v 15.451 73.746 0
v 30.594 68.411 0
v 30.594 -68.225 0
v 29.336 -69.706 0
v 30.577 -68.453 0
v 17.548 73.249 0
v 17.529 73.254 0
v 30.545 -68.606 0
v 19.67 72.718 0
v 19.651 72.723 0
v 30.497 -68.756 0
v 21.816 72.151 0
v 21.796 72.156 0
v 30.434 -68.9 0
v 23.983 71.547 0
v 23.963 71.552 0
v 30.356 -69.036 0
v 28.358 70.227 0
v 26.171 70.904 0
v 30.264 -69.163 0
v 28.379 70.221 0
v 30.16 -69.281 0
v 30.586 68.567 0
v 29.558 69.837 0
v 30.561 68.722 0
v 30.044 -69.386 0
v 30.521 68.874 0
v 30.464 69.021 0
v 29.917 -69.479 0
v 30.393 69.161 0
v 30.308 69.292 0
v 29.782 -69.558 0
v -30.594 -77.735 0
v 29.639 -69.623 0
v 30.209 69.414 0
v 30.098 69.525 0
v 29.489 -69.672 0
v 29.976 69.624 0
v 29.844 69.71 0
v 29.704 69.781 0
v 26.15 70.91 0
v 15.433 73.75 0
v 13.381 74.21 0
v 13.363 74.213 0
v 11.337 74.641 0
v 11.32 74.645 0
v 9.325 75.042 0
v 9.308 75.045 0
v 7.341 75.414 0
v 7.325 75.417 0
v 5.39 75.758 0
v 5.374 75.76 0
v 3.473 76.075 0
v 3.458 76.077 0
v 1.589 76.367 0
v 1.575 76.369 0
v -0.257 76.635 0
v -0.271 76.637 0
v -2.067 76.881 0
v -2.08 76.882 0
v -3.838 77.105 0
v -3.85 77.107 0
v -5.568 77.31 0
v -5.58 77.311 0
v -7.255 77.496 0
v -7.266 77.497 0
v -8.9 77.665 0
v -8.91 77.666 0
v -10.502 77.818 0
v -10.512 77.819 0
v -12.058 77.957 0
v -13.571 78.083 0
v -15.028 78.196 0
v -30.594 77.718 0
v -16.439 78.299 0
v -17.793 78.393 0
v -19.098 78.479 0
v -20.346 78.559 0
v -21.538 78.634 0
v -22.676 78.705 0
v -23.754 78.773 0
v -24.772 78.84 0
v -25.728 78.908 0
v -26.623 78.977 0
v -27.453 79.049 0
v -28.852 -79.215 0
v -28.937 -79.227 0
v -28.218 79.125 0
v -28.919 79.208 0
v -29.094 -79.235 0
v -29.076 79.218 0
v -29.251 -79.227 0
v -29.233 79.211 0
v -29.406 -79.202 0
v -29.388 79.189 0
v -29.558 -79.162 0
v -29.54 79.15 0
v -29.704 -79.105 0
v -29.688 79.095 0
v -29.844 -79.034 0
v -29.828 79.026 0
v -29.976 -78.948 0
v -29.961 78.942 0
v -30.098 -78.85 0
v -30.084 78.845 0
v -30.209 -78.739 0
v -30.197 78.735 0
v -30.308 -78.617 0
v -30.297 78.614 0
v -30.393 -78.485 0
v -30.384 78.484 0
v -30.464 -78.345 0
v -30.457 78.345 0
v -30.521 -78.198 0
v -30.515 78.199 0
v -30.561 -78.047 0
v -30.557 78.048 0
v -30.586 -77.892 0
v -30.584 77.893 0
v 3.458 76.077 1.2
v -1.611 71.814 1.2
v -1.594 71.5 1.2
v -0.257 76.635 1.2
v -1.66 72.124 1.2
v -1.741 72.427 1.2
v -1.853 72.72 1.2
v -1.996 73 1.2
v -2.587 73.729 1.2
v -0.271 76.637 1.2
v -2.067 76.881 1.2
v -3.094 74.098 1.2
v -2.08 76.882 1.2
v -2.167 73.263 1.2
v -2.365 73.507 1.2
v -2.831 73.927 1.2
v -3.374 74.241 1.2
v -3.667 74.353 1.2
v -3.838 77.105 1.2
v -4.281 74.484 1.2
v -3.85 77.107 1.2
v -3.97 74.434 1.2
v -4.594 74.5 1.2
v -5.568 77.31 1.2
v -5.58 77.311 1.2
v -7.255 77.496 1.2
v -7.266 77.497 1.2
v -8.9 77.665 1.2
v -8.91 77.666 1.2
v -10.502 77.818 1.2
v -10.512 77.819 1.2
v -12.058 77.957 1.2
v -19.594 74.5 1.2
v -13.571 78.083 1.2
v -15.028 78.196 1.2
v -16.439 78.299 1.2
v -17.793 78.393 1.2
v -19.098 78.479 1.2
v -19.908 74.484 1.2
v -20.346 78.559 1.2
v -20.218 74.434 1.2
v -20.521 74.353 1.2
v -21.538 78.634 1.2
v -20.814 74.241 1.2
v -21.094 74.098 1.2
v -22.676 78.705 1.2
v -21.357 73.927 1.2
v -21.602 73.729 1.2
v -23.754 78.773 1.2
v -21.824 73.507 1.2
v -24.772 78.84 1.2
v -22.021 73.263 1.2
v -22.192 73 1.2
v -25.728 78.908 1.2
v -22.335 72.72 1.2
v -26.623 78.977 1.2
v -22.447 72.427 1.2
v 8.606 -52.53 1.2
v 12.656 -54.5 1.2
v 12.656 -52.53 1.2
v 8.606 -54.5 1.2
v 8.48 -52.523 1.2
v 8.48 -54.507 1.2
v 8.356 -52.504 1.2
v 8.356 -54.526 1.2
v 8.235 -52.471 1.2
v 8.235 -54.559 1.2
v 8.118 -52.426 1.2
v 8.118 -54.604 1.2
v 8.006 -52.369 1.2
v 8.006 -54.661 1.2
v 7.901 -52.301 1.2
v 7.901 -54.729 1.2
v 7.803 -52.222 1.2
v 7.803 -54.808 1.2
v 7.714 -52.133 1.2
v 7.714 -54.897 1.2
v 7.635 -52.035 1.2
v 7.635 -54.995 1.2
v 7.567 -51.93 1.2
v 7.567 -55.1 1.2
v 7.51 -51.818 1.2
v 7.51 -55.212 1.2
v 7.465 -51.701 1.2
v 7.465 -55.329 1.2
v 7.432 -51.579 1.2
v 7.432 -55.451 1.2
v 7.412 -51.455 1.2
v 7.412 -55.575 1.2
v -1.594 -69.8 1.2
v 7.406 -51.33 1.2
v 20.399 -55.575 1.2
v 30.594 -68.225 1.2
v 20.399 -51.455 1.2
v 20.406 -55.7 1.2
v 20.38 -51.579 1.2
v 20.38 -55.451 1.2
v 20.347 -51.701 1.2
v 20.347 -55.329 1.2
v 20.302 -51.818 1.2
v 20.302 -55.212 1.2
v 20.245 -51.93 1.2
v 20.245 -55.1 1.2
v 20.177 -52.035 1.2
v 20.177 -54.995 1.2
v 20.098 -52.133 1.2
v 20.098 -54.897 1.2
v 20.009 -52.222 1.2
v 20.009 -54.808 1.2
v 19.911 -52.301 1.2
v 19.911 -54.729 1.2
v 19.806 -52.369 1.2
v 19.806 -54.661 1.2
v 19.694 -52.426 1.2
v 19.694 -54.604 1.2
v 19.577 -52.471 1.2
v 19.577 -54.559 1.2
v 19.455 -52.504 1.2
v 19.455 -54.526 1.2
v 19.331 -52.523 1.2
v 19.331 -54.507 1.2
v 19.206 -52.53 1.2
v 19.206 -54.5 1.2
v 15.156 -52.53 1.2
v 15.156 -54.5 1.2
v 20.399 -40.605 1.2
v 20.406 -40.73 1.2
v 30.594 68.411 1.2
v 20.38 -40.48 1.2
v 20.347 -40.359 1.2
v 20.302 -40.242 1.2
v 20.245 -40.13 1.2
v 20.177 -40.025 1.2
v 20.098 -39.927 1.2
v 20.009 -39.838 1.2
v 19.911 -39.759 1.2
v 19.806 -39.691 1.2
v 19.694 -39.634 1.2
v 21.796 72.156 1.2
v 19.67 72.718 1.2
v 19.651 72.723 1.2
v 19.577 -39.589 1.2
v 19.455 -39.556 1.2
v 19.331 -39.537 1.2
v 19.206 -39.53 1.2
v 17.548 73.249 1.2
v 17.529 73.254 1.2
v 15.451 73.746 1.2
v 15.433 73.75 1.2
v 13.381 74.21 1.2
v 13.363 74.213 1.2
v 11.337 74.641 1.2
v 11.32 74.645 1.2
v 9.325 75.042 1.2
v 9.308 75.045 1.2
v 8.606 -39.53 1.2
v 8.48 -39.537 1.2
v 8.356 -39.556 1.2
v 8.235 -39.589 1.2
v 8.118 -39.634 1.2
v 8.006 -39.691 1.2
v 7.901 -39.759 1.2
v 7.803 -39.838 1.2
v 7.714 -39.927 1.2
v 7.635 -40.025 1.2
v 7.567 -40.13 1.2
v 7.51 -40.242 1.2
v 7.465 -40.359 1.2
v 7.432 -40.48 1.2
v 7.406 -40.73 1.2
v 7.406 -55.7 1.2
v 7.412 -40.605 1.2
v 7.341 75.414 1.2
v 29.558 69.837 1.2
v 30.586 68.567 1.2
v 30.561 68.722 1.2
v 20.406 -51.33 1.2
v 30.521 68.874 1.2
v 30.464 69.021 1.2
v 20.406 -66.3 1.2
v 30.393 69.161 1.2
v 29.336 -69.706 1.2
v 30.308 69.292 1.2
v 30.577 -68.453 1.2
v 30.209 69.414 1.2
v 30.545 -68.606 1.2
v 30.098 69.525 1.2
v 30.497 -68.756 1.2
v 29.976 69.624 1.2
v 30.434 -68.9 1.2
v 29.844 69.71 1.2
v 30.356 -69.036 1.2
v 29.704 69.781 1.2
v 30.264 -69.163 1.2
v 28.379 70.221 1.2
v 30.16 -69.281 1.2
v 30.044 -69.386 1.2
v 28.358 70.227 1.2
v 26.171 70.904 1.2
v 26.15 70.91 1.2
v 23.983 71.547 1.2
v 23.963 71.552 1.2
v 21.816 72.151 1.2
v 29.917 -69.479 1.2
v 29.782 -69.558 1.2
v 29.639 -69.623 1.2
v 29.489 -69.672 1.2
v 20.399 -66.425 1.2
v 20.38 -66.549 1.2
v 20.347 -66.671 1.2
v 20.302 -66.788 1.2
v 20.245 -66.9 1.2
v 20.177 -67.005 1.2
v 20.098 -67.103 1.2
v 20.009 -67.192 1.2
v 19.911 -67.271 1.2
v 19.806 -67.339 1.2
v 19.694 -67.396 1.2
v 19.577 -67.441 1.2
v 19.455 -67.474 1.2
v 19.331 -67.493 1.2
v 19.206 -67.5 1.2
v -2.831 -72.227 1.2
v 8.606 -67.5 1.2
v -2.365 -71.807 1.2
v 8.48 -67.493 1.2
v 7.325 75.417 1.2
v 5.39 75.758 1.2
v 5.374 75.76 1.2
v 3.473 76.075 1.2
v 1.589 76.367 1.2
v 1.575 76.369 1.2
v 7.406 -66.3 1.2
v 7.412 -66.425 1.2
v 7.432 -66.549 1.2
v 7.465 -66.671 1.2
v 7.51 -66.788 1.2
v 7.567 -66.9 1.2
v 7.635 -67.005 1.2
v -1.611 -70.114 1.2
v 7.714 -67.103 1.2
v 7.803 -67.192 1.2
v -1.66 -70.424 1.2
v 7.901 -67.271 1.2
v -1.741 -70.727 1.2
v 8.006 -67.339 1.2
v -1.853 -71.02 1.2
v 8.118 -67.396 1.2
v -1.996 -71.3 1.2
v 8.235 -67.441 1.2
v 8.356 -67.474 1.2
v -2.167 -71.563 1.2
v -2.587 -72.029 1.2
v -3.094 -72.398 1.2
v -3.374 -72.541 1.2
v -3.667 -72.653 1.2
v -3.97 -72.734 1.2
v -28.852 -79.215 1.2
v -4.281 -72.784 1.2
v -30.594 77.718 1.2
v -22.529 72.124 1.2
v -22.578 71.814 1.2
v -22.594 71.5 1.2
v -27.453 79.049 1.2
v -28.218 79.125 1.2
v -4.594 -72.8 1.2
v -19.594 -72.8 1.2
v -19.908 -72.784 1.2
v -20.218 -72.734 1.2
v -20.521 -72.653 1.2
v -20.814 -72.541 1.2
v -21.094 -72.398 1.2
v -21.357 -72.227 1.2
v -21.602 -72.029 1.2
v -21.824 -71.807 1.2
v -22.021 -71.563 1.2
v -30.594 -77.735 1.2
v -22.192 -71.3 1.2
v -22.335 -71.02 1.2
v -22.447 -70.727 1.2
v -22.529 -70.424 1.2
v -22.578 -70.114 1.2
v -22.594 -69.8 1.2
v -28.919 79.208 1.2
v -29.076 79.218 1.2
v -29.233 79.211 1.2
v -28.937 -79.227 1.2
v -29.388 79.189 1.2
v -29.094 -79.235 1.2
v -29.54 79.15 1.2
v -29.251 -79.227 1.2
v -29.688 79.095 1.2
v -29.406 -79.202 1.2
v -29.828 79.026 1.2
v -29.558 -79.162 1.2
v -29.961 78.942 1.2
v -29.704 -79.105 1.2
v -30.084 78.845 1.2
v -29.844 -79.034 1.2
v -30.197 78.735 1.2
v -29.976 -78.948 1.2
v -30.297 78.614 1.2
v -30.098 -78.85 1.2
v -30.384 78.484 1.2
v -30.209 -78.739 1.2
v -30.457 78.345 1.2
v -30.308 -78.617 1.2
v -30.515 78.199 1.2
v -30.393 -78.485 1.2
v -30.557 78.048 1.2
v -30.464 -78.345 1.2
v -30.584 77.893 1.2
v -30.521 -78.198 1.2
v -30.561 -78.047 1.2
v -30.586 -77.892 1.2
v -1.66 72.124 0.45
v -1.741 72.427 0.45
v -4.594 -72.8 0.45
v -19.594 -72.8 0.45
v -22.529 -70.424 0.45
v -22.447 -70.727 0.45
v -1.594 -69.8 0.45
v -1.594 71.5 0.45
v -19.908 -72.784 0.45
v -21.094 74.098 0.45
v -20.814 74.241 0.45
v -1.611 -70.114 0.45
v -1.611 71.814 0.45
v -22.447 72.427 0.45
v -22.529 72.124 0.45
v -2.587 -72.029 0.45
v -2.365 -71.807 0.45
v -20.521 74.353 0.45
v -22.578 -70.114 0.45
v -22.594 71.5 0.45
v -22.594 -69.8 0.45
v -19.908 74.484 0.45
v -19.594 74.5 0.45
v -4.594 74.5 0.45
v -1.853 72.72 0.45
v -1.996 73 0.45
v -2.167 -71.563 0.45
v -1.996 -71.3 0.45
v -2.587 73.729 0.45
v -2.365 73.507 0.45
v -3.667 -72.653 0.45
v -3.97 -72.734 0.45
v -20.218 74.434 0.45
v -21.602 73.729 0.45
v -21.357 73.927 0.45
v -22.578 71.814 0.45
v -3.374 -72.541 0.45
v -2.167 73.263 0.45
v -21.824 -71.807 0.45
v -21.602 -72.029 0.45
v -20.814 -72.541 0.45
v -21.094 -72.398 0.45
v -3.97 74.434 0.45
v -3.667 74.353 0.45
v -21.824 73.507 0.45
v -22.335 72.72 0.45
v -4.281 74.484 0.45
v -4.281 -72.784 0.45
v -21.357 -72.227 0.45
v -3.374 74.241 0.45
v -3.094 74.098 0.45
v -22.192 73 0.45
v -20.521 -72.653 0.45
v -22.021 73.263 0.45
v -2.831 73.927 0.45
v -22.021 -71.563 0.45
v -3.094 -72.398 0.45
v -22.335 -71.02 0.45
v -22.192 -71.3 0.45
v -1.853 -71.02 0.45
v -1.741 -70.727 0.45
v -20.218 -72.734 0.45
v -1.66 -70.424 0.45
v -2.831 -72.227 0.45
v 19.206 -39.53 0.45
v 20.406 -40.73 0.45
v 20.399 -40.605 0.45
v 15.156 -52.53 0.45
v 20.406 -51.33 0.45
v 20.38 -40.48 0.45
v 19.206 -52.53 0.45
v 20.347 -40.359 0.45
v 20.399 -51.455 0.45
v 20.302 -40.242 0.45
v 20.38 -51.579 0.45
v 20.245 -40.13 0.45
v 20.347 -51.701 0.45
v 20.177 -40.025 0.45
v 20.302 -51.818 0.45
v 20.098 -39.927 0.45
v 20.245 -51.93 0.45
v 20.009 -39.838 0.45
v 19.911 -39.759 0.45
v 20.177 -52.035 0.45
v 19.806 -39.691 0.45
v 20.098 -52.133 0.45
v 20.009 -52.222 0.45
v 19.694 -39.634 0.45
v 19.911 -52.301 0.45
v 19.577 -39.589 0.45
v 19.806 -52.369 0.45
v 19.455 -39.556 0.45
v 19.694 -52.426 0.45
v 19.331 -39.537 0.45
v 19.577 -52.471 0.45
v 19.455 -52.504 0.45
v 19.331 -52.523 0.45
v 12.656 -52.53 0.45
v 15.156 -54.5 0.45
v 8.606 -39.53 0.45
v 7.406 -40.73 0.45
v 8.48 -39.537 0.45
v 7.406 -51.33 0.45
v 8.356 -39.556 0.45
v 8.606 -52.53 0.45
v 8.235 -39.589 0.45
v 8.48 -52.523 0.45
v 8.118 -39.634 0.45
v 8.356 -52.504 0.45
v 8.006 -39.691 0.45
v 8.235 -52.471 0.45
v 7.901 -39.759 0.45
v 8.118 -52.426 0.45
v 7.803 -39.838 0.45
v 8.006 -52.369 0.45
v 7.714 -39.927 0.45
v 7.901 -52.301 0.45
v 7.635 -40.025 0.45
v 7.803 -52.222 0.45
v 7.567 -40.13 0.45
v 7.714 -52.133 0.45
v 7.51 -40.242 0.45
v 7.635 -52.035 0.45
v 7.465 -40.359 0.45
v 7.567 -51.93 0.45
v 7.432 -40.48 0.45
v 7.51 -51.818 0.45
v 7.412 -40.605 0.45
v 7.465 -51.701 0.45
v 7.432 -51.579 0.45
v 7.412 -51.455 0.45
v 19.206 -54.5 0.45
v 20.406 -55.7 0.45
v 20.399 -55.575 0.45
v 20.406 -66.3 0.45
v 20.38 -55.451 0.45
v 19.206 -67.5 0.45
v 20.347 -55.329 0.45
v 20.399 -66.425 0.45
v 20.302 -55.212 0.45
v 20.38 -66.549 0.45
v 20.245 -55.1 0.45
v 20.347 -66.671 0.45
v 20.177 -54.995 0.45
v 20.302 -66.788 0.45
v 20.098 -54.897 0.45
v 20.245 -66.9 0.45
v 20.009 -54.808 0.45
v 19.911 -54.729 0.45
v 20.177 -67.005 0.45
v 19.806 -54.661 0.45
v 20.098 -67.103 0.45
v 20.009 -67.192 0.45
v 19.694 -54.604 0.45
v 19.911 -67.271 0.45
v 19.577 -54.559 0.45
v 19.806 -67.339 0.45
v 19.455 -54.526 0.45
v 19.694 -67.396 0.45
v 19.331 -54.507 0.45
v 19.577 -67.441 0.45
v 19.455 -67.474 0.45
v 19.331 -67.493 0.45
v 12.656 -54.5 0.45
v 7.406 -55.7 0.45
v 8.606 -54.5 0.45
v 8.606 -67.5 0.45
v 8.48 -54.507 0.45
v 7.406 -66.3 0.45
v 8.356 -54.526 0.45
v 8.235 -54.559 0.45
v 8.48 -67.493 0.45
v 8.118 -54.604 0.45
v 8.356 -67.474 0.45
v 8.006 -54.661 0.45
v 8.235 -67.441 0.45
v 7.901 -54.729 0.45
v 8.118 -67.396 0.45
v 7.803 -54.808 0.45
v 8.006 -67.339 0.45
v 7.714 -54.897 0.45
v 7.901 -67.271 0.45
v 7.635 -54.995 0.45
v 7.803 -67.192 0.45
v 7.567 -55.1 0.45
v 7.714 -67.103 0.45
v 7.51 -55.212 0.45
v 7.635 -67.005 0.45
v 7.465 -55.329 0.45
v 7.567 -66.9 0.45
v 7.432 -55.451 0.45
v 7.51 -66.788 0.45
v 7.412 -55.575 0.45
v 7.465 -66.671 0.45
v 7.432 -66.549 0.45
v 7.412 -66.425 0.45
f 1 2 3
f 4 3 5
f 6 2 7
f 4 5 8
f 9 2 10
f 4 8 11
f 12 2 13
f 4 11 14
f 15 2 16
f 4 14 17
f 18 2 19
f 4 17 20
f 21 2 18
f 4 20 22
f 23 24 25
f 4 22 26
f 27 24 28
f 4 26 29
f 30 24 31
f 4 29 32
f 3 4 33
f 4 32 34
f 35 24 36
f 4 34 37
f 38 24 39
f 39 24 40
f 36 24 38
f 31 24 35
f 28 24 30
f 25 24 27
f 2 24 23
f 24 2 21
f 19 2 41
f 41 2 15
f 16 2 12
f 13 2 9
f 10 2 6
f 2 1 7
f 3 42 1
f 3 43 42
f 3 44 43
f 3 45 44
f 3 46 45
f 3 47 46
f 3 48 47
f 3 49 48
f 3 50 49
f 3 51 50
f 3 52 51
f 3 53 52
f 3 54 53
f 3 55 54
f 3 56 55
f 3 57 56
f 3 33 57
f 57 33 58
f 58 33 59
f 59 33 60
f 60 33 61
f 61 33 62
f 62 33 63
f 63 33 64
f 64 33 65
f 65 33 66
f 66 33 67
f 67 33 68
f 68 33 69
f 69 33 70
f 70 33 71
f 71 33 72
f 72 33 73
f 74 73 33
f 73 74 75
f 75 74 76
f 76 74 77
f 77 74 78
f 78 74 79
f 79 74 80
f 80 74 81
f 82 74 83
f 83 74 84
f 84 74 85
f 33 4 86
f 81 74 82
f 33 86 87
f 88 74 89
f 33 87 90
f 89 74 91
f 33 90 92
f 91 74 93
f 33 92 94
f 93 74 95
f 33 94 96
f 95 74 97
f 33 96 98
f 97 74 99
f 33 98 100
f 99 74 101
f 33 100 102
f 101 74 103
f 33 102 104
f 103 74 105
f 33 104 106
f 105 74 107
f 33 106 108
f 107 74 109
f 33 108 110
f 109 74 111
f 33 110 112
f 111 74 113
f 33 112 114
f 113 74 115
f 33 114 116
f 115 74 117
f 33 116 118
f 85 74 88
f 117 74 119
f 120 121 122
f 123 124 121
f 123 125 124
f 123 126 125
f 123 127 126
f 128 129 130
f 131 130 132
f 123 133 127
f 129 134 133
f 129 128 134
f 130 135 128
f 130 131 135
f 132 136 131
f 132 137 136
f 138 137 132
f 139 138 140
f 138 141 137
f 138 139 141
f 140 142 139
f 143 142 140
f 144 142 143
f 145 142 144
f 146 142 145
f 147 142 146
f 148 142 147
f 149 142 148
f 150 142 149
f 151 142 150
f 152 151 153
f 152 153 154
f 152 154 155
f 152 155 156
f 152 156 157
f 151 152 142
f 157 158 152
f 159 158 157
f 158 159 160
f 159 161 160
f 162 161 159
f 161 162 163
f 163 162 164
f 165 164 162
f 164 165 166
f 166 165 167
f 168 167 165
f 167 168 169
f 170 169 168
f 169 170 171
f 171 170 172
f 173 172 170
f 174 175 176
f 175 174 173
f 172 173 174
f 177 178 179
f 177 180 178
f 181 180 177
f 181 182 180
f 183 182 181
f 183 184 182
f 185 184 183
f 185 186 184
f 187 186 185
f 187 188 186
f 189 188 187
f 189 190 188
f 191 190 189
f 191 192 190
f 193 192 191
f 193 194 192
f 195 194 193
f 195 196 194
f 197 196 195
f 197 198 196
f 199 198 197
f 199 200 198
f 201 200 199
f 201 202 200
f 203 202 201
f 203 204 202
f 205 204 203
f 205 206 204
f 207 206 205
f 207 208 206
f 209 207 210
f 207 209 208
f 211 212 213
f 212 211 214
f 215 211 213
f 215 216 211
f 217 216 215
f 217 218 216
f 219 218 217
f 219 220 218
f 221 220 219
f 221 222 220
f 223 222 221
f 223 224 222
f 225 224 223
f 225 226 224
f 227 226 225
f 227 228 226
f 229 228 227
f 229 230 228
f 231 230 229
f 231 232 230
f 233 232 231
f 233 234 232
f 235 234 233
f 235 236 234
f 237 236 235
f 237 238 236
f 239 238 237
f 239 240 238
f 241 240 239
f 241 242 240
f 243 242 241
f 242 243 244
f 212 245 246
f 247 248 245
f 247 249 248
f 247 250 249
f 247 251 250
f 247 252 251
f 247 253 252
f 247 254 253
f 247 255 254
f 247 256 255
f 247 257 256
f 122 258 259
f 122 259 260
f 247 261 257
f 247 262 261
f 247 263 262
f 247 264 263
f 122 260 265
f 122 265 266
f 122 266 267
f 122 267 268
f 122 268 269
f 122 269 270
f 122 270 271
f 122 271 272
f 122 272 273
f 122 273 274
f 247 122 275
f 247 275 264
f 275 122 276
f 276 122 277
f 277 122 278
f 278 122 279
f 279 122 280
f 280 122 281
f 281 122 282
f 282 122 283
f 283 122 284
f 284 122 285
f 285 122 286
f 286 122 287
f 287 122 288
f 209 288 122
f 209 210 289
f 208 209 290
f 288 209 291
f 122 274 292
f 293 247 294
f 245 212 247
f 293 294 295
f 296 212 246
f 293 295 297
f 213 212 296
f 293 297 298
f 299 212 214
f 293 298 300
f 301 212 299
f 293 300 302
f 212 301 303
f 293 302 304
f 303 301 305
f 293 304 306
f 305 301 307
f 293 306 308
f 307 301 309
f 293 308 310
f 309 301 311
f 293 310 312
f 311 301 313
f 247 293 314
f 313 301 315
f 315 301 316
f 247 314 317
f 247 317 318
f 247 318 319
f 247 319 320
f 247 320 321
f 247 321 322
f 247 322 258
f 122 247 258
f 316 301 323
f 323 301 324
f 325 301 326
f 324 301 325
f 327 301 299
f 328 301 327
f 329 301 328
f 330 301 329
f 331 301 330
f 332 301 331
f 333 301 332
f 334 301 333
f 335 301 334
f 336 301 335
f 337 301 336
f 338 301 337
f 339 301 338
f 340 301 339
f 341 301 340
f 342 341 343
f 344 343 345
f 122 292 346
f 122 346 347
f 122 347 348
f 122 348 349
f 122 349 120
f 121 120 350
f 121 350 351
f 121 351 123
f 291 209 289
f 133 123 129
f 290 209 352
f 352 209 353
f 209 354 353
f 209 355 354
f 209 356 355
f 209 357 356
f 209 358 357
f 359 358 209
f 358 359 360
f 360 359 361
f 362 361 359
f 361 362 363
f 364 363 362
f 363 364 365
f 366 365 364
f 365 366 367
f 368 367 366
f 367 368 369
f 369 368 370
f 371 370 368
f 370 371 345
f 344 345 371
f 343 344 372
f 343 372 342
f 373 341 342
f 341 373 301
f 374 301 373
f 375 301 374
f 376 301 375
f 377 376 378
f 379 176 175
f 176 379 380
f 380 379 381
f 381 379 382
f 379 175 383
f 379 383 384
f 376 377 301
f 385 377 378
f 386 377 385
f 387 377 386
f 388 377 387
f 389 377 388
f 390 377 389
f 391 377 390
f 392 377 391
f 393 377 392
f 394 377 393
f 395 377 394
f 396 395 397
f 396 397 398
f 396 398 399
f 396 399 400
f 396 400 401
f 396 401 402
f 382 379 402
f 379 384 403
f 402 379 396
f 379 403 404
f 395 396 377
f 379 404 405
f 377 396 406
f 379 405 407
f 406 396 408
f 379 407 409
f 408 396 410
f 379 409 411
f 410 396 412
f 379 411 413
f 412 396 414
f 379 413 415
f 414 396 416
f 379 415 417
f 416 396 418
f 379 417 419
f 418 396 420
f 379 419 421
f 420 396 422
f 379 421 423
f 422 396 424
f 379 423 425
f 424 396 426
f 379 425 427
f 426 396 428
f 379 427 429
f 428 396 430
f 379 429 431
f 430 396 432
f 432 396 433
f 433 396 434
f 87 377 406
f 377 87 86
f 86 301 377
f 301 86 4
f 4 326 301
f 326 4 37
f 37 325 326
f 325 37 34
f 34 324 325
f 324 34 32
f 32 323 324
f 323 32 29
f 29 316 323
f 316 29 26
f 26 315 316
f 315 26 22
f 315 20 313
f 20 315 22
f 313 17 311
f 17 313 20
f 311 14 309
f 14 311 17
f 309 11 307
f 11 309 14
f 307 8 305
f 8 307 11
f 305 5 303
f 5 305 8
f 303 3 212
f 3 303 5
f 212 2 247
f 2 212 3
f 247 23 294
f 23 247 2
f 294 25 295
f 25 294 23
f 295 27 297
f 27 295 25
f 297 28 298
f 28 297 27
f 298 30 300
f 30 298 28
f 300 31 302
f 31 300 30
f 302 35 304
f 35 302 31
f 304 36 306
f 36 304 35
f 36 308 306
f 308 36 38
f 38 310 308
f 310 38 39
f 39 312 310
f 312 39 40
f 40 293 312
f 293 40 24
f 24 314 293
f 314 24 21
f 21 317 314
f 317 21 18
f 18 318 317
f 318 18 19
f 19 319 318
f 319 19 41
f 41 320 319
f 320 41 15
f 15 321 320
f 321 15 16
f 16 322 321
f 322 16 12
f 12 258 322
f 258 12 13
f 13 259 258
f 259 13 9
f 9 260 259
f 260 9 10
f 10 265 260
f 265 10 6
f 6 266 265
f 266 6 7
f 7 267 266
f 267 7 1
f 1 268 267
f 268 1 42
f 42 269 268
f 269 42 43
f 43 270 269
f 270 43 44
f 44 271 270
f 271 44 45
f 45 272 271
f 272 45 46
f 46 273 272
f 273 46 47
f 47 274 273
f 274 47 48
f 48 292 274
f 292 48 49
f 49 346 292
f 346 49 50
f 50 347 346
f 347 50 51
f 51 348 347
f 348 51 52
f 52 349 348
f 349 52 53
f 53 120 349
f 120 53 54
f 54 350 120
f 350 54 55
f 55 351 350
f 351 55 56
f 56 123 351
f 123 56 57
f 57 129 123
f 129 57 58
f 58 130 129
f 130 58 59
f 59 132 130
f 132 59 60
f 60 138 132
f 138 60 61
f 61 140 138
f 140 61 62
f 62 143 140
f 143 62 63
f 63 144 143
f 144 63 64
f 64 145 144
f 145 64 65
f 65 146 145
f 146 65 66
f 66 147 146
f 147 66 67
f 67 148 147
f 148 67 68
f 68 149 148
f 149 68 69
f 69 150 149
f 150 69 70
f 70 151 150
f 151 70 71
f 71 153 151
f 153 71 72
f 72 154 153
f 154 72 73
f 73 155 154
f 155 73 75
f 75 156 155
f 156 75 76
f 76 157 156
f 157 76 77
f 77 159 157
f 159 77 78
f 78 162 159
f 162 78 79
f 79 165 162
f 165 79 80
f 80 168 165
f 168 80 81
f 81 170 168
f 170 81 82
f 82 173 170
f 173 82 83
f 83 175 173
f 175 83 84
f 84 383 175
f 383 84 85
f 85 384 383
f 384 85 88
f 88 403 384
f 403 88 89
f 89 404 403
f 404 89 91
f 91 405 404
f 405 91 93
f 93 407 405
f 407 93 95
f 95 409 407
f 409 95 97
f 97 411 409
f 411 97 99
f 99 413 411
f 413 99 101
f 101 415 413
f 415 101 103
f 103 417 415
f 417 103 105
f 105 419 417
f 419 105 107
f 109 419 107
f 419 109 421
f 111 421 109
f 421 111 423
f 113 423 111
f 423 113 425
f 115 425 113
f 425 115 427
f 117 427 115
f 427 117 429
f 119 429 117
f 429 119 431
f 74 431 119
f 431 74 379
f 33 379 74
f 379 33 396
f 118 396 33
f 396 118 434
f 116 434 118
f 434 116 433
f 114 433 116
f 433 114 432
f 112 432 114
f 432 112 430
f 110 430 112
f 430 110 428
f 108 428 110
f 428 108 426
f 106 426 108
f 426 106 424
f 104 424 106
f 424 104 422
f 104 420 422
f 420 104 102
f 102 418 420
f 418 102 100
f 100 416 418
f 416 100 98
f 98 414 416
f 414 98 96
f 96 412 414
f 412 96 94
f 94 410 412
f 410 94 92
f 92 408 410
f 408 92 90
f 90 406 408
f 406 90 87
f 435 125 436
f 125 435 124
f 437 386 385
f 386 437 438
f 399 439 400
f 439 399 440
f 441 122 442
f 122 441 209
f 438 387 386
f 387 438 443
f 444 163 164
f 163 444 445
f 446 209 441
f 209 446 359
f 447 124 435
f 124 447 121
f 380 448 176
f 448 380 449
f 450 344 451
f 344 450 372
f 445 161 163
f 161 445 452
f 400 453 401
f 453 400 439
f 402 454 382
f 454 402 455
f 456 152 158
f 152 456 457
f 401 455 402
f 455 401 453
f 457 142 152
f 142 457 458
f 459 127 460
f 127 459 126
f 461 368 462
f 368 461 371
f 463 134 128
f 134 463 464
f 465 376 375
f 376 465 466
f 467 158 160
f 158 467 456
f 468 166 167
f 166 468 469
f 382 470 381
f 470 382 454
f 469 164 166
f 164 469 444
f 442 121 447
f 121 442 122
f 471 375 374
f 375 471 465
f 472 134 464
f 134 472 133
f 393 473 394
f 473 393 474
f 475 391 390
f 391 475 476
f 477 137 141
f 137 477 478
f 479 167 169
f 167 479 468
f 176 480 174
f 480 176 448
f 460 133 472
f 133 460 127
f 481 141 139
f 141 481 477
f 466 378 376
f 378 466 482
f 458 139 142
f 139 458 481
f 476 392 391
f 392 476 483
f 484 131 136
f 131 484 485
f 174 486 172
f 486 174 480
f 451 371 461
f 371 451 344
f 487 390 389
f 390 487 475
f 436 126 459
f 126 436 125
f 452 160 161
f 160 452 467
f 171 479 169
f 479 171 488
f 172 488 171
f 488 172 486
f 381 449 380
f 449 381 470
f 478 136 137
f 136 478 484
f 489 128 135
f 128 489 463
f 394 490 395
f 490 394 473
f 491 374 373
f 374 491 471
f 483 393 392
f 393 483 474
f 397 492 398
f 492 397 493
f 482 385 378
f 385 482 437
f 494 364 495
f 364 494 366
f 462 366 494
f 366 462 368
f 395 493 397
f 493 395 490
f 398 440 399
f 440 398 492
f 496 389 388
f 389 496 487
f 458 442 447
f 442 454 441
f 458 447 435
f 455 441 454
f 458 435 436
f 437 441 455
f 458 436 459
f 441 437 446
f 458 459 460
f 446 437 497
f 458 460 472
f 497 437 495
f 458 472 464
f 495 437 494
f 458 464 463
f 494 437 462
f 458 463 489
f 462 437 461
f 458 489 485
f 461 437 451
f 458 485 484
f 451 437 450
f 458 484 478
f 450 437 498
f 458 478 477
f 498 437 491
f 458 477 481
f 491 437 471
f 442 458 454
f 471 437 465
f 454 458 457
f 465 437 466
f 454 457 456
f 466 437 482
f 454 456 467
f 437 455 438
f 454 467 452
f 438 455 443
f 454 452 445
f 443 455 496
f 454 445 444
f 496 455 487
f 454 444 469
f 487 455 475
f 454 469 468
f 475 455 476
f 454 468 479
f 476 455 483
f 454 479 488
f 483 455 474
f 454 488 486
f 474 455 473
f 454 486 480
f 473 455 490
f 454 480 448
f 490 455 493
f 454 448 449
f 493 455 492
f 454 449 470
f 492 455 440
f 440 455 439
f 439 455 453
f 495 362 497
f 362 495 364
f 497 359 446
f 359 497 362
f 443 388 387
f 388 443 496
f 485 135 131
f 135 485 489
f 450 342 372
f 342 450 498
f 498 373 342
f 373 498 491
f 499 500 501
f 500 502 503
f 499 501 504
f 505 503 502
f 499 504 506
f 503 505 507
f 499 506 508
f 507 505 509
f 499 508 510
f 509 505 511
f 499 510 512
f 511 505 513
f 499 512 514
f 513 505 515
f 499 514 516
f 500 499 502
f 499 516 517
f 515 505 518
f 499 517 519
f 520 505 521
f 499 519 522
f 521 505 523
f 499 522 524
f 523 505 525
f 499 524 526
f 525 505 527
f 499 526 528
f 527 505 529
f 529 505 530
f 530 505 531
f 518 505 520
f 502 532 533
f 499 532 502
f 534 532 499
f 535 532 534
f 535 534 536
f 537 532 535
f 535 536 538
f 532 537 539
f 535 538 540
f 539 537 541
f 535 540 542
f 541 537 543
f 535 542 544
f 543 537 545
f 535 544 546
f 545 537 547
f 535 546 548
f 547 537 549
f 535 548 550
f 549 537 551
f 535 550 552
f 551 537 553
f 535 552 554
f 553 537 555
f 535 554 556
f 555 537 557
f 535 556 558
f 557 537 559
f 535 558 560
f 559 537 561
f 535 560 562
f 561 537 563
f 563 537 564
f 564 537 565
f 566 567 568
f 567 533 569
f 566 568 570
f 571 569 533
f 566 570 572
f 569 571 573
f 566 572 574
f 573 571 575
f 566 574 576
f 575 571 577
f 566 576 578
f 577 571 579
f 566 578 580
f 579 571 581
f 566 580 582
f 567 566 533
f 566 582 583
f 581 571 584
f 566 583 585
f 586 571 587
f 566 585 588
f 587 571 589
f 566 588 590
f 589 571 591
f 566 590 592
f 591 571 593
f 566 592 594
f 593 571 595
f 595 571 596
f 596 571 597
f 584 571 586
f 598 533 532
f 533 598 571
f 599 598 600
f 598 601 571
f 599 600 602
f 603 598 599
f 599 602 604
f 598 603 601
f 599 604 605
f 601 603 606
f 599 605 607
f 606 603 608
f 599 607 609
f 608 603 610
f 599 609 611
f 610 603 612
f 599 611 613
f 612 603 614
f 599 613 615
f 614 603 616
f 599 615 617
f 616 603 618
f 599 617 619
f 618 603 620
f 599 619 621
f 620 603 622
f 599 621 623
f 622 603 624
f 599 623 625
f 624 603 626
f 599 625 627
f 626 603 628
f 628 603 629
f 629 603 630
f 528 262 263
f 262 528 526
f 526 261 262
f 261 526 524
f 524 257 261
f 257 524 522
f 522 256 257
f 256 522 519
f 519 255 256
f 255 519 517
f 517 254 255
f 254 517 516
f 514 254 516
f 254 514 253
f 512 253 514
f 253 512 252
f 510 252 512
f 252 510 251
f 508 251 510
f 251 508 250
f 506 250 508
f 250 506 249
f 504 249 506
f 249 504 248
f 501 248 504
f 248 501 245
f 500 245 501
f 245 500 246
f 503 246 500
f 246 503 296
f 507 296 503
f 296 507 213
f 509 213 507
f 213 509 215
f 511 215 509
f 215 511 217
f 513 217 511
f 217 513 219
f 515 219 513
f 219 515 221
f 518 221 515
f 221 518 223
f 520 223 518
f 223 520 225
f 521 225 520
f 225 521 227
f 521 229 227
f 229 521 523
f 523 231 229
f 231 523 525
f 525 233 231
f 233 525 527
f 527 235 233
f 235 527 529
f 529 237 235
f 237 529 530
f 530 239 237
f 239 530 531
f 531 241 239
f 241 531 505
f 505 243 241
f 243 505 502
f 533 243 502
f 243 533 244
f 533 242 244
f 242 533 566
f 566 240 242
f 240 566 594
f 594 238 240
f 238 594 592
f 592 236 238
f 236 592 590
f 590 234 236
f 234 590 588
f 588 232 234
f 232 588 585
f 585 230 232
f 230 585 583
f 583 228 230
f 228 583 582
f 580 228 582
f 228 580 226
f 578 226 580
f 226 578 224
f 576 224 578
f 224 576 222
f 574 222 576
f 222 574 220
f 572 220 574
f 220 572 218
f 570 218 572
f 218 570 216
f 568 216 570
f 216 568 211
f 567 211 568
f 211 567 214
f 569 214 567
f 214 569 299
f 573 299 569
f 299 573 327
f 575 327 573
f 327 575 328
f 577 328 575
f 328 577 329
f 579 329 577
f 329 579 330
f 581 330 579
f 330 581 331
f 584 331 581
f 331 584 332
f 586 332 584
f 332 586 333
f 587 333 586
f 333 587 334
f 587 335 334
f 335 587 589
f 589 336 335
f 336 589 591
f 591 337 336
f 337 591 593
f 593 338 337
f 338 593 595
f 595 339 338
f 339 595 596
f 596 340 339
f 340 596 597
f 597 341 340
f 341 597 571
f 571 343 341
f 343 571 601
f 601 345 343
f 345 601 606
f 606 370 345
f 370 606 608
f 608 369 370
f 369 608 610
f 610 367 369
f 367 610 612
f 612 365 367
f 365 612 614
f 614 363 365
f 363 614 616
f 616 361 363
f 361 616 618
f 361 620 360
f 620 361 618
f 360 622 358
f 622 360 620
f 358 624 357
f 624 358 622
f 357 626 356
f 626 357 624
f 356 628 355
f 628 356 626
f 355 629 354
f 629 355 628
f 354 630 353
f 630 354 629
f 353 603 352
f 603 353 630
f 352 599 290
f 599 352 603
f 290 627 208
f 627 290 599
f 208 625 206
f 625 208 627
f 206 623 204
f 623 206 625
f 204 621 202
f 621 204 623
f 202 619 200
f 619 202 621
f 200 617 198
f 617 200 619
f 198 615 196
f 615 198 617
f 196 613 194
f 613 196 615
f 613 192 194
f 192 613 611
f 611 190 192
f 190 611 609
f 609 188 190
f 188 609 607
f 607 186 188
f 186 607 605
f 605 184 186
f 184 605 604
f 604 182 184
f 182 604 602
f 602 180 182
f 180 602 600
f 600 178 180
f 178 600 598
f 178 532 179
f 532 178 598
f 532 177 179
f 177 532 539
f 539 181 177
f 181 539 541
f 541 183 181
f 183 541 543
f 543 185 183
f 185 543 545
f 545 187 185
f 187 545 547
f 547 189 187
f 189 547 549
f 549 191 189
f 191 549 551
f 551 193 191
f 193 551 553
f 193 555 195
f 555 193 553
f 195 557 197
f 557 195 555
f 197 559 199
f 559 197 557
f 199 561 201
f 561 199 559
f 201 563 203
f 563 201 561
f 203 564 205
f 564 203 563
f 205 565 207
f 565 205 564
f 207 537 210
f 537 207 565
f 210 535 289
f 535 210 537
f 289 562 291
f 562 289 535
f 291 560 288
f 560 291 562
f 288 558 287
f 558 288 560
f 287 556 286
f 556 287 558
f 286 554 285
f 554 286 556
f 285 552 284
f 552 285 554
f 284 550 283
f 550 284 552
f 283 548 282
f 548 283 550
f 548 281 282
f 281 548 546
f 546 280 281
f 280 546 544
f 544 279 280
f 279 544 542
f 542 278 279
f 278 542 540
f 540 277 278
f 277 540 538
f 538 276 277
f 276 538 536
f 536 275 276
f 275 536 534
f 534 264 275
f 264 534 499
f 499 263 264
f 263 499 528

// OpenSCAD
// ============================================================
// Omnichord OM-84 Strumplate Top Plate
// ============================================================
// A cover plate that sits over the flex PCB strum strip.
// Two features create the gap needed between the flex PCB
// contacts and the conductive strumming surface:
//
//   1. MAIN VALLEY  -> a shallow recess: a slim rectangle with small
//      rounded corners at the short ends (NOT a fat pill/stadium),
//      running nearly the FULL length of the plate, independent of
//      where the pad cluster sits, cut to recess_depth.
//   2. PAD RECESS   -> a shallow pocket (same recess_depth) over the
//      small contact pad near the top, connected to a second
//      smaller pocket by a thin bridge slot (matches the two
//      cutouts + connecting tab seen in the reference CAD model).
//
// Both recesses are cut from the TOP face only, leaving a thin,
// paper-thin BOTTOM skin (bottom_skin_thickness) untouched -- that
// skin is the side the user's finger touches, and should be printed
// face-down on the bed as the first layer for max smoothness.
//
// Adjust the PARAMETERS block below to match your real
// measurements -- nothing else needs to change.
// ============================================================

/* [Overall plate -- asymmetric trapezoid with an S-curved top edge] */
// The two LONG edges (left & right) are PARALLEL to each other and are
// the sides the long valley recess runs alongside. The two SHORT edges
// (top & bottom) connect them and are NOT parallel to each other.
// The TOP short edge (opposite the pad cluster, which is mirrored to
// sit near the bottom in the 3D assembly below) is not straight -- it's
// a smooth S-curve built from a cubic Bezier with two INDEPENDENTLY
// tunable control points, so the two lobes (peaks/valleys) of the S no
// longer have to mirror each other.
edge_left_long   = 159;  // length of the long left edge, mm
edge_right_long  = 139;  // length of the long right edge, mm
edge_top_short   = 62;   // length of the short top edge, mm (straight-line/chord distance
                          // between TL and TR -- the S-curve deviates from this)
edge_bottom_short = 62;  // length of the short bottom edge, mm (straight)
corner_radius     = 1.5; // small rounding at all four corners (just enough to not be knife-sharp)

// --- S-curve control points (independent left/right lobes) ---
// The curve is a cubic Bezier from TL to TR:
//   P0 = TL
//   P1 = TL + t1*chord + outward_dir * ctrl1_offset   (controls the LEFT lobe)
//   P2 = TL + t2*chord + outward_dir * ctrl2_offset   (controls the RIGHT lobe)
//   P3 = TR
// where "outward_dir" points away from the plate body (so a POSITIVE
// offset bulges OUT, a NEGATIVE offset dips IN).
//
// IMPORTANT -- these are CONTROL POINT offsets, not the final realized
// peak deviation of the curve. A cubic Bezier always pulls the curve back
// toward its endpoints, so the actual peak bulge/dip you see will be
// noticeably SMALLER than these numbers (very roughly 30-45% of the
// control offset for typical t1/t2 values below, but the two lobes
// interact with each other, so there's no single exact conversion
// factor when they're independent -- nudge the numbers and re-render
// to dial in the look, rather than solving for an exact target).
scurve_t1          = 0.1;  // 0-1, position of the LEFT control point along the chord
scurve_ctrl1_offset = -0.5;    // mm, LEFT lobe control offset (+ = bulges out, - = dips in)
scurve_t2          = 0.5;  // 0-1, position of the RIGHT control point along the chord
scurve_ctrl2_offset = 5;  // mm, RIGHT lobe control offset (+ = bulges out, - = dips in)
scurve_resolution   = 40;   // number of segments used to sample the curve (higher = smoother)

// --- Derived corner geometry (do not edit) ---
// Solve for the perpendicular distance `plate_w` between the two parallel
// long edges, and the vertical stagger `edge_offset` of the right edge
// relative to the left edge, such that the connecting short edges come
// out to edge_top_short / edge_bottom_short exactly (using the straight-
// line/chord length for the top edge, since the S-curve is added after).
// System (derived once and baked in as a closed-form solution):
//   bottom_short^2 = plate_w^2 + edge_offset^2
//   top_short^2    = plate_w^2 + (edge_left_long - (edge_offset + edge_right_long))^2
// Subtracting and solving for edge_offset:
_k = edge_left_long - edge_right_long;
edge_offset = ( (edge_bottom_short*edge_bottom_short) - (edge_top_short*edge_top_short) + (_k*_k) ) / (2*_k);
plate_w = sqrt(edge_bottom_short*edge_bottom_short - edge_offset*edge_offset);

// Corner coordinates (left edge along x=0, right edge along x=plate_w),
// then re-centered so x=0 sits on the long-axis centerline and y=0 sits
// at the vertical midpoint of the left edge, for convenient downstream use.
_BL = [0, 0];
_TL = [0, edge_left_long];
_BR = [plate_w, edge_offset];
_TR = [plate_w, edge_offset + edge_right_long];
_cx = plate_w/2;
_cy = edge_left_long/2;
BL = _BL - [_cx, _cy];
TL = _TL - [_cx, _cy];
BR = _BR - [_cx, _cy];
TR = _TR - [_cx, _cy];

// plate_length kept for backward compatibility with valley/pad placement
// below -- approximate overall span used for "distance from top" offsets.
plate_length = max(TL.y, TR.y) - min(BL.y, BR.y);

// The plate is built from two thicknesses stacked:
//   bottom_skin_thickness -> the touch surface (prints FIRST, face-down on the bed).
//                            Keep this paper-thin (1-2 perimeter layers, e.g. 0.2-0.4mm
//                            at a 0.2mm layer height) so finger contact can reach through
//                            wherever the recess above it is cut.
//   recess_depth           -> how deep the valley/pad recesses cut into the TOP face.
// plate_thickness is just their sum -- change the two thickness values, not this one.
bottom_skin_thickness = 0.45;   // <-- paper-thin touch surface, tune to your layer height
recess_depth          = 0.75;   // depth of the valley + pad recesses, cut from the top
plate_thickness        = bottom_skin_thickness + recess_depth;

/* [Main valley - shallow recess, sized to the OM-84 flex PCB contact row] */
// Measured from the OM-84 strumplate_traces.svg: 13 contacts, pitch
// 11.275mm center-to-center, each contact finger 13.698mm long (the
// across-strip dimension) x 4.421mm wide (the along-strip dimension).
contact_pitch       = 11.275; // mm, center-to-center spacing along the strip
contact_count       = 13;     // number of contacts in the row
valley_width      = 21;   // matches the OM-84 contact finger length (across-strip)
valley_length     = contact_pitch * (contact_count - 1) + 12; // total span of the row, ~139.7mm
valley_margin_top    = 5;  // gap kept between the top-left corner and the start of the valley
                             // (only used to help VERTICALLY CENTER the now fixed-length valley;
                             // see valley_2d() below)
valley_inset      = valley_width/2+8;    // how far in from the LEFT edge the recess sits, mm
valley_end_radius = 3;    // corner rounding radius at the two short ends (small radius,
                           // NOT half the width -- gives slim rounded-rect ends like the
                           // metallic strip in the reference photo, not a full pill cap)

/* [Pad recess cluster - sized to the OM-84 flex PCB pad contacts] */
// Measured from the same SVG: pad pitch 14.97mm center-to-center.
pad_contact_pitch = 14.97;  // mm, center-to-center spacing between the two pads
pad1_w = 13; pad1_h = 13;   // upper pad rectangle (rounded)
pad2_w = 13; pad2_h = 13;   // lower pad rectangle (rounded)
pad_corner_r       = 1.2;   // corner rounding for the pad rectangles
pad_gap            = pad_contact_pitch - pad1_h/2 - pad2_h/2; // vertical gap between pad1/pad2, derived from pitch
tab_width          = 2.5;   // width of the connecting bridge slot between pad1/pad2
min_wall_to_valley = 4;     // (unused now that spacing is set directly by distance below;
                             // kept only for reference/back-compat)
pad_to_valley_center_dist = 26; // distance between pad-cluster center and valley center, mm

// Final layout: the VALLEY sits on the NEGATIVE X side (toward the
// left edge) and stays exactly where it was. The PAD CLUSTER's center
// is placed exactly pad_to_valley_center_dist (35mm) away from the
// valley's center, along X.
pad_cluster_half_w = max(pad1_w, pad2_w) / 2;
valley_x_center = BL.x + valley_inset;
pad_offset_x = valley_x_center + pad_to_valley_center_dist;
pad_offset_y_top = TL.y - 25 + 13;   // y position where pad1 (upper) starts, measured down from top-left corner

/* [Rendering] */
$fn = 60;

// ============================================================
// 2D PROFILES
// ============================================================

// Asymmetric trapezoid plate outline: long left edge and long right
// edge are parallel; short bottom edge is straight; short TOP edge is
// a cubic-Bezier S-curve with two independently tunable control points
// (see scurve_* parameters above), built from the solved corner points
// BL/TL/BR/TR, with small corner rounding applied at the end.
function _bezier(t, P0,P1,P2,P3) =
    pow(1-t,3)*P0 + 3*pow(1-t,2)*t*P1 + 3*(1-t)*pow(t,2)*P2 + pow(t,3)*P3;

module plate_solid_2d() {
    chord = TR - TL;
    chord_len = norm(chord);
    u = chord / chord_len;
    perp = [u.y, -u.x];
    plate_center_dir = ((BL + BR) / 2) - (TL + TR) / 2;
    // outward_dir points AWAY from the plate body (so + offsets bulge out)
    outward_dir = (perp.x*plate_center_dir.x + perp.y*plate_center_dir.y > 0) ? -perp : perp;

    P0 = TL;
    P1 = TL + scurve_t1*chord + outward_dir*scurve_ctrl1_offset;
    P2 = TL + scurve_t2*chord + outward_dir*scurve_ctrl2_offset;
    P3 = TR;

    N = scurve_resolution;
    // sampled TL -> TR; reversed below for correct polygon winding
    top_curve_TL_to_TR = [
        for (i = [0:N])
            _bezier(i/N, P0, P1, P2, P3)
    ];
    top_curve_pts = [for (i = [N:-1:0]) top_curve_TL_to_TR[i]]; // TR -> ... -> TL

    offset(r = corner_radius)
        offset(delta = -corner_radius)
            polygon(points = concat([BL, BR], top_curve_pts));
}

// Single rounded rectangle helper (centered)
module rounded_rect(w, h, r) {
    hull() {
        translate([ w/2 - r,  h/2 - r]) circle(r = r);
        translate([-w/2 + r,  h/2 - r]) circle(r = r);
        translate([ w/2 - r, -h/2 + r]) circle(r = r);
        translate([-w/2 + r, -h/2 + r]) circle(r = r);
    }
}

// Main valley: long slim rectangle with small rounded corners at the
// short ends, sized to exactly span the OM-84 contact row (fixed
// valley_length, see PARAMETERS), inset in from the left edge.
module valley_2d() {
    y_top = TL.y - valley_margin_top;
    y_center = y_top - valley_length/2;

    translate([valley_x_center, y_center])
        rounded_rect(valley_width, valley_length, valley_end_radius);
}

// Pad recess cluster: pad1 (upper) + pad2 (lower) + connecting bridge tab
module pad_cluster_2d() {
    pad1_cy = pad_offset_y_top - pad1_h/2;
    pad2_cy = pad1_cy - pad1_h/2 - pad_gap - pad2_h/2;

    union() {
        translate([pad_offset_x, pad1_cy])
            rounded_rect(pad1_w, pad1_h, pad_corner_r);

        translate([pad_offset_x, pad2_cy])
            rounded_rect(pad2_w, pad2_h, pad_corner_r);

        // connecting bridge between the two pads
        translate([pad_offset_x, (pad1_cy + pad2_cy)/2])
            square([tab_width, pad1_h/2 + pad_gap + pad2_h/2], center = true);
    }
}

// ============================================================
// 3D ASSEMBLY
// ============================================================
// Orientation: z=0 is the BOTTOM touch surface (this should be
// the face that sits on the print bed, i.e. print this part
// face-down / recesses-up so the smooth first layer becomes the
// finger-touch side). z = plate_thickness is the TOP face where
// both recesses are cut in.

module strumplate() {
    difference() {
        // base plate
        linear_extrude(height = plate_thickness)
            plate_solid_2d();

        // 1) main valley -- shallow recess cut from the TOP face only,
        //    leaving bottom_skin_thickness of solid material below it
        translate([0, 0, bottom_skin_thickness])
            linear_extrude(height = recess_depth + 0.5)
                valley_2d();

        // 2) pad recess -- shallow pocket cut from the TOP face only,
        //    same depth, same remaining bottom skin
        translate([0, 0, bottom_skin_thickness])
        mirror([0,1,0])
            linear_extrude(height = recess_depth + 0.5)
                pad_cluster_2d();
    }
}

strumplate();

// ------------------------------------------------------------
// Uncomment to sanity-check the 2D layout from directly above
// before committing to the 3D print:
// projection(cut = false) strumplate();
